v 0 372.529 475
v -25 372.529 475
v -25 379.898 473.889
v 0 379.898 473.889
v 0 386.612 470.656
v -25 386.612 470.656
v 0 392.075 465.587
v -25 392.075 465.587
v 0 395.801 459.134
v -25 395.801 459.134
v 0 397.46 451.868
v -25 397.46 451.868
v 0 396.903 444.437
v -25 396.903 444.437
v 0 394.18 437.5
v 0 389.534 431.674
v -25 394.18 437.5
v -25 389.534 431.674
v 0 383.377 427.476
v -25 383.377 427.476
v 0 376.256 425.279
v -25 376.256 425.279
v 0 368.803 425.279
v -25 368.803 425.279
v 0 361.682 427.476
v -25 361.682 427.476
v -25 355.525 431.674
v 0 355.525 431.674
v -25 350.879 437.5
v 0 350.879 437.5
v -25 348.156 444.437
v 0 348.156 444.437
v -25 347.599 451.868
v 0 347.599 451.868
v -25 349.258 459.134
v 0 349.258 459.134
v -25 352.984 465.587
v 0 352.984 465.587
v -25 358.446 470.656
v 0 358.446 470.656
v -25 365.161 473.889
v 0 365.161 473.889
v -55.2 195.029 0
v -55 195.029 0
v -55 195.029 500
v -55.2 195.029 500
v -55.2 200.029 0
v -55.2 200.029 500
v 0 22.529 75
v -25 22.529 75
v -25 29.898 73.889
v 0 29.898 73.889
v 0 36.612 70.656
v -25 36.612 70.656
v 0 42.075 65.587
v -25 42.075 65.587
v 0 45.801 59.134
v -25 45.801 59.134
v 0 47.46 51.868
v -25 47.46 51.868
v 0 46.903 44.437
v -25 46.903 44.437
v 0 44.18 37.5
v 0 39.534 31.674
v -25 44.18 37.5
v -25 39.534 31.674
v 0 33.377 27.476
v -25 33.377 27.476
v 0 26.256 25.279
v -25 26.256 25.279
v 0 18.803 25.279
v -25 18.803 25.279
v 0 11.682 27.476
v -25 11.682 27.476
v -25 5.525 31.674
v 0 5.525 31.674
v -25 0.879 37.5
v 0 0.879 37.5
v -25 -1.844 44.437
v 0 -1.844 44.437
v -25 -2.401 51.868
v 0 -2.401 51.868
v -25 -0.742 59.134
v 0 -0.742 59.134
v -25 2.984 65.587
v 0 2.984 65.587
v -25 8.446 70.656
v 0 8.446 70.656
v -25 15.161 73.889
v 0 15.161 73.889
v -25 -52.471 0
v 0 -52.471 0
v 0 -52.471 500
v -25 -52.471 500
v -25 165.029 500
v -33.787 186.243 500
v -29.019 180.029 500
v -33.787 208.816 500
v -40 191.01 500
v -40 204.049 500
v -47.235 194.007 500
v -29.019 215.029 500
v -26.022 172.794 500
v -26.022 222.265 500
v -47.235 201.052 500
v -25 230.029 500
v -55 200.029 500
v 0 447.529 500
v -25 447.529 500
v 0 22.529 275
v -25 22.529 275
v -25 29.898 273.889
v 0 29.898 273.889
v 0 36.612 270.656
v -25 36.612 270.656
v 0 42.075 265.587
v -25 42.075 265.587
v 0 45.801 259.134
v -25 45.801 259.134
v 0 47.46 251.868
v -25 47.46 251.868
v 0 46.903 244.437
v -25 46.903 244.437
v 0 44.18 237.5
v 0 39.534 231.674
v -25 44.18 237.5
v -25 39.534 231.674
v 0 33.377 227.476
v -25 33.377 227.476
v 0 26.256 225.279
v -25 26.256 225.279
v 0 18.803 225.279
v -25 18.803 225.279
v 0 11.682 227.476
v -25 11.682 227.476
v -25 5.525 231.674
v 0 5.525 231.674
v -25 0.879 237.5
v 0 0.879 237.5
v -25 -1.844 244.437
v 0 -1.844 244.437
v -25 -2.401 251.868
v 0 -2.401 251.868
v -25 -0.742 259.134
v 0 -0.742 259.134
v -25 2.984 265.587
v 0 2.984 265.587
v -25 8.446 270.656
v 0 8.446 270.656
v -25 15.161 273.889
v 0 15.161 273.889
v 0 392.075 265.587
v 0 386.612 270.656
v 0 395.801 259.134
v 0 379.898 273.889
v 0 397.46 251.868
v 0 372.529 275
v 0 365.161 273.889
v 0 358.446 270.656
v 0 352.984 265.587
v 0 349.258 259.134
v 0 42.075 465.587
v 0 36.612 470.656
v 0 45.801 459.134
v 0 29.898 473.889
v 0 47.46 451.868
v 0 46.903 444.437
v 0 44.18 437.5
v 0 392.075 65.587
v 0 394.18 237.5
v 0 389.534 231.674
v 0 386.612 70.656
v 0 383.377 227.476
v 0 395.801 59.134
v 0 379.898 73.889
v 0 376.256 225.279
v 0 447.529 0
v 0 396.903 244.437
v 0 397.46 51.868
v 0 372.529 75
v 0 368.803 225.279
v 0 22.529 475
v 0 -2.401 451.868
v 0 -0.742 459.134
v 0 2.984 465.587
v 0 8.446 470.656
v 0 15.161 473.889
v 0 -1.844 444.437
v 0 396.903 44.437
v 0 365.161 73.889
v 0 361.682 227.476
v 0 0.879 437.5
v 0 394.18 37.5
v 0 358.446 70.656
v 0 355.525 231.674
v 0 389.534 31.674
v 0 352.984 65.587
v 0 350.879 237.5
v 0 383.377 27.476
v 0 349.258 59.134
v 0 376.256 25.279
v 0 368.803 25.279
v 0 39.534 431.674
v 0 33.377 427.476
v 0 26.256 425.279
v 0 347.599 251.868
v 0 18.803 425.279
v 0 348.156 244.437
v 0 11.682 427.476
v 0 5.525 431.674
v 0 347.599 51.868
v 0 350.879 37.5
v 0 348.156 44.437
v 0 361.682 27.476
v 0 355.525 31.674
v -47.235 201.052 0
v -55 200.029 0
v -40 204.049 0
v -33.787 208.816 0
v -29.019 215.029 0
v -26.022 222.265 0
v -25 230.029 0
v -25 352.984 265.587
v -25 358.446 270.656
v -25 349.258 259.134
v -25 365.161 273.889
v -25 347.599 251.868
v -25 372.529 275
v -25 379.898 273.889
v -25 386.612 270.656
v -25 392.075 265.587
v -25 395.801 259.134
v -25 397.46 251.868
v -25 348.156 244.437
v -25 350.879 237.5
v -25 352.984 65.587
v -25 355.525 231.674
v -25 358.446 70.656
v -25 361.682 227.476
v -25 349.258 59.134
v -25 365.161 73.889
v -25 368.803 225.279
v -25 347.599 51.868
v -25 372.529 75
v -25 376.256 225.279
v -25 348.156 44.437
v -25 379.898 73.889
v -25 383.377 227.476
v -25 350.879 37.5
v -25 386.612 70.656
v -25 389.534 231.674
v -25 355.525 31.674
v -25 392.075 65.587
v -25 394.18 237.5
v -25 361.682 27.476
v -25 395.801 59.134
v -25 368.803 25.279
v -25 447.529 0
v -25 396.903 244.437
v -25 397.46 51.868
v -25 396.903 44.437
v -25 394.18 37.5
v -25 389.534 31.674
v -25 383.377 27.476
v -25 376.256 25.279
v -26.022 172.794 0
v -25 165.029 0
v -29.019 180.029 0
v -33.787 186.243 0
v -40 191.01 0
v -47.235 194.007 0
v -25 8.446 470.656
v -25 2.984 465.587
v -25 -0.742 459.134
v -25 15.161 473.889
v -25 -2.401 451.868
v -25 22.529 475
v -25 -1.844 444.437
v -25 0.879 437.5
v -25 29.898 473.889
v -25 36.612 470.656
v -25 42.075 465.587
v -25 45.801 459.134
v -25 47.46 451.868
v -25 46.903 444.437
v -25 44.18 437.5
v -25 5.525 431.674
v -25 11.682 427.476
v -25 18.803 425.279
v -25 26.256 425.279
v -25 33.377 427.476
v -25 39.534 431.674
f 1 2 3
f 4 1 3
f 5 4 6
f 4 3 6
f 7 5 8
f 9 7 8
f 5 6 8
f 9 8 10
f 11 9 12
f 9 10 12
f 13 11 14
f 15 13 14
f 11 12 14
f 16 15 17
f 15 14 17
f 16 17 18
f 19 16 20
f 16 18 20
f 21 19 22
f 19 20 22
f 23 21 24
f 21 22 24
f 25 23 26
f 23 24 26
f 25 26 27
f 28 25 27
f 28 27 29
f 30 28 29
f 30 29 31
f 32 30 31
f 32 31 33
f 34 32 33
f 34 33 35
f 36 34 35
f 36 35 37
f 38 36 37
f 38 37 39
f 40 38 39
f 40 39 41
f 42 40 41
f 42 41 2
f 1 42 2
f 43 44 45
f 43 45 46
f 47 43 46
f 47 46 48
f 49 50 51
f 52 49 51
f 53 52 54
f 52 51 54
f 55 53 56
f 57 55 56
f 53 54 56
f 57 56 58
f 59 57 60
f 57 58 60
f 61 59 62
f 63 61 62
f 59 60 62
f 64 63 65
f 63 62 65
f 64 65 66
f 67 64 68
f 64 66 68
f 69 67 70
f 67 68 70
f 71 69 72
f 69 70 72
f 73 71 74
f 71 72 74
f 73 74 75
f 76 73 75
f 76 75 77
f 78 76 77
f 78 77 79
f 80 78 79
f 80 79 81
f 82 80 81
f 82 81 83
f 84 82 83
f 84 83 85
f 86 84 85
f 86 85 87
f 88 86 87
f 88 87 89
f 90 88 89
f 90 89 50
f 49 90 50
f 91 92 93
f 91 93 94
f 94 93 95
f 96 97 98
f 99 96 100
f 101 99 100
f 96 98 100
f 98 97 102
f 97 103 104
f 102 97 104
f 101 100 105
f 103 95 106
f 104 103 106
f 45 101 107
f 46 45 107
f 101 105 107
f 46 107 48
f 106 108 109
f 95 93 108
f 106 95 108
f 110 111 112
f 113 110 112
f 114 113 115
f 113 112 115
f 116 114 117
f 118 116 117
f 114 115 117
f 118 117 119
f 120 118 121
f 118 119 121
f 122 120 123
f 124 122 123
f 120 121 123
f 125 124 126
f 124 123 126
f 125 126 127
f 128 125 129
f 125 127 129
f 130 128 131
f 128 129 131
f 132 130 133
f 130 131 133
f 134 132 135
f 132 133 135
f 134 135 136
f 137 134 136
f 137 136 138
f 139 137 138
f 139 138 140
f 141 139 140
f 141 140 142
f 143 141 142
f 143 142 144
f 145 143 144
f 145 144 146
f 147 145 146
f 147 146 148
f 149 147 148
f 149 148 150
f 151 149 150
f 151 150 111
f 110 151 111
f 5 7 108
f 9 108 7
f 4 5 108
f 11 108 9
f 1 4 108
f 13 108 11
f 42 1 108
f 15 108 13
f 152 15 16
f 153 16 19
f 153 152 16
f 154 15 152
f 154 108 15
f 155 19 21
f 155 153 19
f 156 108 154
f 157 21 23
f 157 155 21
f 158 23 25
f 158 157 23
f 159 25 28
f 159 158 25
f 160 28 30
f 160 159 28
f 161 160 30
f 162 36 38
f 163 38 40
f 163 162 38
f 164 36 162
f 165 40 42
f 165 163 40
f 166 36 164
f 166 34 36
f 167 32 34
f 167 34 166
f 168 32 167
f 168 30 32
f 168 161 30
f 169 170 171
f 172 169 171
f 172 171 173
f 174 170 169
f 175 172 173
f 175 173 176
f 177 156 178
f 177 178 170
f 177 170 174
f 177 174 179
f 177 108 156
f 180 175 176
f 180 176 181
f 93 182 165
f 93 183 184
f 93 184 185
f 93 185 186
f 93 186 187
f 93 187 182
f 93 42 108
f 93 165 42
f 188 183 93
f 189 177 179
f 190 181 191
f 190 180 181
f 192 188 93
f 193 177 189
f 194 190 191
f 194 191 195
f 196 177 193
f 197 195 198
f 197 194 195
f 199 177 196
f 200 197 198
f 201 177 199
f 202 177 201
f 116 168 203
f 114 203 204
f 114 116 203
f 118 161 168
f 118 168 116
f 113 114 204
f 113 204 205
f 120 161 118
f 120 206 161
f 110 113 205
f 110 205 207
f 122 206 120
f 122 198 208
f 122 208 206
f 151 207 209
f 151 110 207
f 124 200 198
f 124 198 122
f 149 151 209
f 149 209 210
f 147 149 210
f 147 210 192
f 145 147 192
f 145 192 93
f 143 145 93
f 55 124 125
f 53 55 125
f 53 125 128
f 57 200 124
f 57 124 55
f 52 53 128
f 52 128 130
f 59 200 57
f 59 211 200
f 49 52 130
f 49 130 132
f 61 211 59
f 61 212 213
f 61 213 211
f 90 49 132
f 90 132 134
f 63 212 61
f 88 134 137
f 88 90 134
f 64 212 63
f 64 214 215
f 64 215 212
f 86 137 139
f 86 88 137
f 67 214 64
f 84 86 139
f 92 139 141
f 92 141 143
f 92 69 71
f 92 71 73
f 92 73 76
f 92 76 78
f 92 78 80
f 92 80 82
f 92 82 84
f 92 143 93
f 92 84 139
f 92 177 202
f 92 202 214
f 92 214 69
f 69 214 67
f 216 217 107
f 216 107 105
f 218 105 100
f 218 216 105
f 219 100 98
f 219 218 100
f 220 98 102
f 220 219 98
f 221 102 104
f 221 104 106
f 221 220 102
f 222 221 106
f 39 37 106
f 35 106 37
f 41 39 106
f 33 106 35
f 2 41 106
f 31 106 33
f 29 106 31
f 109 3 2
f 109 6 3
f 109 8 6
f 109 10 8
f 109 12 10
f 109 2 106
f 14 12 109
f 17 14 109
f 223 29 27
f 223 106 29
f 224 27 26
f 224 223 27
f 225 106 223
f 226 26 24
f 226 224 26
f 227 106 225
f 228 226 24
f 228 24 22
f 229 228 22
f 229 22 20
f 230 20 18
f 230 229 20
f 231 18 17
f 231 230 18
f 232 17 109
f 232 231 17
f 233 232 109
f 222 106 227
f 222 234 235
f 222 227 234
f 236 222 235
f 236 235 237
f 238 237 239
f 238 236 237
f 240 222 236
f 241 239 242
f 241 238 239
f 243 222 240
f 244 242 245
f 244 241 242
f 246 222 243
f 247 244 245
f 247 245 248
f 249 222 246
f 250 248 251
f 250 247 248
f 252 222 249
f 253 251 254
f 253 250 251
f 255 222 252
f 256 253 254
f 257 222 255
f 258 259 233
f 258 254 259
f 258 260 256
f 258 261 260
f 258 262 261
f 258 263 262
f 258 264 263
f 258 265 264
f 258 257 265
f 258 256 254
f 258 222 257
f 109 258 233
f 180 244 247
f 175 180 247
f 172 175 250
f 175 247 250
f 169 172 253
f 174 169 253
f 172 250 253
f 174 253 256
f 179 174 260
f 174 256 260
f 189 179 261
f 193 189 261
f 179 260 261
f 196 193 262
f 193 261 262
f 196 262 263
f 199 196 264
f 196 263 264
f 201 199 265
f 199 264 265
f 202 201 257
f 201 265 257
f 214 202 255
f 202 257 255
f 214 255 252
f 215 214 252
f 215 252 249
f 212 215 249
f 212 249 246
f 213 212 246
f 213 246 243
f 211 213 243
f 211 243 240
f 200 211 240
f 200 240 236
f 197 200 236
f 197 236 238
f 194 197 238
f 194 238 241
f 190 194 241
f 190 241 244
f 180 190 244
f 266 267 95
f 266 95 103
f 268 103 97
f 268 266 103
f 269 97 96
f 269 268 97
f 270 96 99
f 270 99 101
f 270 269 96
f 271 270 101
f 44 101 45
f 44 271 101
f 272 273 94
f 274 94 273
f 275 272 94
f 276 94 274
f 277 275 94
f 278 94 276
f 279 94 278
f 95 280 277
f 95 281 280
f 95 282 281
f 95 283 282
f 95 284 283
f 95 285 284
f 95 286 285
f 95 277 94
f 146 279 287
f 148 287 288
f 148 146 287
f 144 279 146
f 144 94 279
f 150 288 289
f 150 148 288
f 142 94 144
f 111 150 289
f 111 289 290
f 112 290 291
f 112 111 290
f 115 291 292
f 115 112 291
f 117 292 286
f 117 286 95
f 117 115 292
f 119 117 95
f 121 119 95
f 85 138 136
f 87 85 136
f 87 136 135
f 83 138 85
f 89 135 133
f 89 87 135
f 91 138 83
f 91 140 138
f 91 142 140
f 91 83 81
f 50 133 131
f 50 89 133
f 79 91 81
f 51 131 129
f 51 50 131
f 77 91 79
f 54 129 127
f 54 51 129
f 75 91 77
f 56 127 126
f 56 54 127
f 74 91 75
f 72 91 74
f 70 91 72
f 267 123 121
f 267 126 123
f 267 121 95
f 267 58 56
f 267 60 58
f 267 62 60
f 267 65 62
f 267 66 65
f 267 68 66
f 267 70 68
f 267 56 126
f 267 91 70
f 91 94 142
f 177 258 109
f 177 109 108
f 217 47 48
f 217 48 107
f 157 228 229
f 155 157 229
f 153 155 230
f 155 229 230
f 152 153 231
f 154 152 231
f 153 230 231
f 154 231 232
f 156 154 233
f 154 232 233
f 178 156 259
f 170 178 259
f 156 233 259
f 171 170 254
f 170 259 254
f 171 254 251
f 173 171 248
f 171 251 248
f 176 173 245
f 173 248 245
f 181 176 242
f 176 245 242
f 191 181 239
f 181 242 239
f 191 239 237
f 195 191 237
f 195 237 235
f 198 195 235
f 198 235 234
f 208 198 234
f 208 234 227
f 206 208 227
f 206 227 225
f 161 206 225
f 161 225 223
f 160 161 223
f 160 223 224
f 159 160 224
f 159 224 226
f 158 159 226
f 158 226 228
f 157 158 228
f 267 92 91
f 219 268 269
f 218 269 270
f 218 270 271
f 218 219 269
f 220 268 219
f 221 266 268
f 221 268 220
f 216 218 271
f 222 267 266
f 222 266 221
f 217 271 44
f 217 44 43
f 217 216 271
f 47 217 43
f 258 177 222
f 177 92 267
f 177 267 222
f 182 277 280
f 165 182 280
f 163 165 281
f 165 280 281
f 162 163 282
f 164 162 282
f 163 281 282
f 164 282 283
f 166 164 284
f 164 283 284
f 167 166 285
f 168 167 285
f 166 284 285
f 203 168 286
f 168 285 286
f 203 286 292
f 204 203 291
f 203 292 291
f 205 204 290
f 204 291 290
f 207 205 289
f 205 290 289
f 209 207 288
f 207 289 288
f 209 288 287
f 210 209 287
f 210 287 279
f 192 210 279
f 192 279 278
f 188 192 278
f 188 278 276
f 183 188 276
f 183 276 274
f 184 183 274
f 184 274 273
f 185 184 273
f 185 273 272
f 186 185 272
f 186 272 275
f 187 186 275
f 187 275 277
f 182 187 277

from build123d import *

# Parameters (mm, degrees)
EXTRUDE1_DEPTH     = 500
SKETCH3_R          = 25
CUT_EXTRUDE1_DEPTH = 672.710252301


with BuildPart() as part:
    # Sketch1 → Extrude1 (new body)
    with BuildSketch(Plane.XY):
        with BuildLine():
            Line((-25, 447.529481132), (0, 447.529481132))
            Line((0, 447.529481132), (0, -52.470518868))
            Line((0, -52.470518868), (-25, -52.470518868))
            Line((-25, -52.470518868), (-25, 0))
            Line((-25, 0), (-25, 165.029481132))
            ThreePointArc((-25, 165.029481132), (-33.786796564, 186.242684568), (-55, 195.029481132))
            Line((-55, 195.029481132), (-55.199777542, 195.029481132))
            Line((-55.199777542, 195.029481132), (-55.199777542, 200.029481132))
            Line((-55.199777542, 200.029481132), (-55, 200.029481132))
            ThreePointArc((-55, 200.029481132), (-33.786796564, 208.816277696), (-25, 230.029481132))
            Line((-25, 230.029481132), (-25, 447.529481132))
        make_face()
    extrude(amount=EXTRUDE1_DEPTH)

    # Sketch3 → Cut-Extrude1 (cut, through all)
    with BuildSketch(Plane.ZY.offset(25)):
        with Locations((450, 22.529481132)):
            Circle(SKETCH3_R)
        with Locations((250, 22.529481132)):
            Circle(SKETCH3_R)
        with Locations((50, 22.529481132)):
            Circle(SKETCH3_R)
        with Locations((450, 372.529481132)):
            Circle(SKETCH3_R)
        with Locations((250, 372.529481132)):
            Circle(SKETCH3_R)
        with Locations((50, 372.529481132)):
            Circle(SKETCH3_R)
    extrude(amount=-CUT_EXTRUDE1_DEPTH, mode=Mode.SUBTRACT)


solid = part.part
